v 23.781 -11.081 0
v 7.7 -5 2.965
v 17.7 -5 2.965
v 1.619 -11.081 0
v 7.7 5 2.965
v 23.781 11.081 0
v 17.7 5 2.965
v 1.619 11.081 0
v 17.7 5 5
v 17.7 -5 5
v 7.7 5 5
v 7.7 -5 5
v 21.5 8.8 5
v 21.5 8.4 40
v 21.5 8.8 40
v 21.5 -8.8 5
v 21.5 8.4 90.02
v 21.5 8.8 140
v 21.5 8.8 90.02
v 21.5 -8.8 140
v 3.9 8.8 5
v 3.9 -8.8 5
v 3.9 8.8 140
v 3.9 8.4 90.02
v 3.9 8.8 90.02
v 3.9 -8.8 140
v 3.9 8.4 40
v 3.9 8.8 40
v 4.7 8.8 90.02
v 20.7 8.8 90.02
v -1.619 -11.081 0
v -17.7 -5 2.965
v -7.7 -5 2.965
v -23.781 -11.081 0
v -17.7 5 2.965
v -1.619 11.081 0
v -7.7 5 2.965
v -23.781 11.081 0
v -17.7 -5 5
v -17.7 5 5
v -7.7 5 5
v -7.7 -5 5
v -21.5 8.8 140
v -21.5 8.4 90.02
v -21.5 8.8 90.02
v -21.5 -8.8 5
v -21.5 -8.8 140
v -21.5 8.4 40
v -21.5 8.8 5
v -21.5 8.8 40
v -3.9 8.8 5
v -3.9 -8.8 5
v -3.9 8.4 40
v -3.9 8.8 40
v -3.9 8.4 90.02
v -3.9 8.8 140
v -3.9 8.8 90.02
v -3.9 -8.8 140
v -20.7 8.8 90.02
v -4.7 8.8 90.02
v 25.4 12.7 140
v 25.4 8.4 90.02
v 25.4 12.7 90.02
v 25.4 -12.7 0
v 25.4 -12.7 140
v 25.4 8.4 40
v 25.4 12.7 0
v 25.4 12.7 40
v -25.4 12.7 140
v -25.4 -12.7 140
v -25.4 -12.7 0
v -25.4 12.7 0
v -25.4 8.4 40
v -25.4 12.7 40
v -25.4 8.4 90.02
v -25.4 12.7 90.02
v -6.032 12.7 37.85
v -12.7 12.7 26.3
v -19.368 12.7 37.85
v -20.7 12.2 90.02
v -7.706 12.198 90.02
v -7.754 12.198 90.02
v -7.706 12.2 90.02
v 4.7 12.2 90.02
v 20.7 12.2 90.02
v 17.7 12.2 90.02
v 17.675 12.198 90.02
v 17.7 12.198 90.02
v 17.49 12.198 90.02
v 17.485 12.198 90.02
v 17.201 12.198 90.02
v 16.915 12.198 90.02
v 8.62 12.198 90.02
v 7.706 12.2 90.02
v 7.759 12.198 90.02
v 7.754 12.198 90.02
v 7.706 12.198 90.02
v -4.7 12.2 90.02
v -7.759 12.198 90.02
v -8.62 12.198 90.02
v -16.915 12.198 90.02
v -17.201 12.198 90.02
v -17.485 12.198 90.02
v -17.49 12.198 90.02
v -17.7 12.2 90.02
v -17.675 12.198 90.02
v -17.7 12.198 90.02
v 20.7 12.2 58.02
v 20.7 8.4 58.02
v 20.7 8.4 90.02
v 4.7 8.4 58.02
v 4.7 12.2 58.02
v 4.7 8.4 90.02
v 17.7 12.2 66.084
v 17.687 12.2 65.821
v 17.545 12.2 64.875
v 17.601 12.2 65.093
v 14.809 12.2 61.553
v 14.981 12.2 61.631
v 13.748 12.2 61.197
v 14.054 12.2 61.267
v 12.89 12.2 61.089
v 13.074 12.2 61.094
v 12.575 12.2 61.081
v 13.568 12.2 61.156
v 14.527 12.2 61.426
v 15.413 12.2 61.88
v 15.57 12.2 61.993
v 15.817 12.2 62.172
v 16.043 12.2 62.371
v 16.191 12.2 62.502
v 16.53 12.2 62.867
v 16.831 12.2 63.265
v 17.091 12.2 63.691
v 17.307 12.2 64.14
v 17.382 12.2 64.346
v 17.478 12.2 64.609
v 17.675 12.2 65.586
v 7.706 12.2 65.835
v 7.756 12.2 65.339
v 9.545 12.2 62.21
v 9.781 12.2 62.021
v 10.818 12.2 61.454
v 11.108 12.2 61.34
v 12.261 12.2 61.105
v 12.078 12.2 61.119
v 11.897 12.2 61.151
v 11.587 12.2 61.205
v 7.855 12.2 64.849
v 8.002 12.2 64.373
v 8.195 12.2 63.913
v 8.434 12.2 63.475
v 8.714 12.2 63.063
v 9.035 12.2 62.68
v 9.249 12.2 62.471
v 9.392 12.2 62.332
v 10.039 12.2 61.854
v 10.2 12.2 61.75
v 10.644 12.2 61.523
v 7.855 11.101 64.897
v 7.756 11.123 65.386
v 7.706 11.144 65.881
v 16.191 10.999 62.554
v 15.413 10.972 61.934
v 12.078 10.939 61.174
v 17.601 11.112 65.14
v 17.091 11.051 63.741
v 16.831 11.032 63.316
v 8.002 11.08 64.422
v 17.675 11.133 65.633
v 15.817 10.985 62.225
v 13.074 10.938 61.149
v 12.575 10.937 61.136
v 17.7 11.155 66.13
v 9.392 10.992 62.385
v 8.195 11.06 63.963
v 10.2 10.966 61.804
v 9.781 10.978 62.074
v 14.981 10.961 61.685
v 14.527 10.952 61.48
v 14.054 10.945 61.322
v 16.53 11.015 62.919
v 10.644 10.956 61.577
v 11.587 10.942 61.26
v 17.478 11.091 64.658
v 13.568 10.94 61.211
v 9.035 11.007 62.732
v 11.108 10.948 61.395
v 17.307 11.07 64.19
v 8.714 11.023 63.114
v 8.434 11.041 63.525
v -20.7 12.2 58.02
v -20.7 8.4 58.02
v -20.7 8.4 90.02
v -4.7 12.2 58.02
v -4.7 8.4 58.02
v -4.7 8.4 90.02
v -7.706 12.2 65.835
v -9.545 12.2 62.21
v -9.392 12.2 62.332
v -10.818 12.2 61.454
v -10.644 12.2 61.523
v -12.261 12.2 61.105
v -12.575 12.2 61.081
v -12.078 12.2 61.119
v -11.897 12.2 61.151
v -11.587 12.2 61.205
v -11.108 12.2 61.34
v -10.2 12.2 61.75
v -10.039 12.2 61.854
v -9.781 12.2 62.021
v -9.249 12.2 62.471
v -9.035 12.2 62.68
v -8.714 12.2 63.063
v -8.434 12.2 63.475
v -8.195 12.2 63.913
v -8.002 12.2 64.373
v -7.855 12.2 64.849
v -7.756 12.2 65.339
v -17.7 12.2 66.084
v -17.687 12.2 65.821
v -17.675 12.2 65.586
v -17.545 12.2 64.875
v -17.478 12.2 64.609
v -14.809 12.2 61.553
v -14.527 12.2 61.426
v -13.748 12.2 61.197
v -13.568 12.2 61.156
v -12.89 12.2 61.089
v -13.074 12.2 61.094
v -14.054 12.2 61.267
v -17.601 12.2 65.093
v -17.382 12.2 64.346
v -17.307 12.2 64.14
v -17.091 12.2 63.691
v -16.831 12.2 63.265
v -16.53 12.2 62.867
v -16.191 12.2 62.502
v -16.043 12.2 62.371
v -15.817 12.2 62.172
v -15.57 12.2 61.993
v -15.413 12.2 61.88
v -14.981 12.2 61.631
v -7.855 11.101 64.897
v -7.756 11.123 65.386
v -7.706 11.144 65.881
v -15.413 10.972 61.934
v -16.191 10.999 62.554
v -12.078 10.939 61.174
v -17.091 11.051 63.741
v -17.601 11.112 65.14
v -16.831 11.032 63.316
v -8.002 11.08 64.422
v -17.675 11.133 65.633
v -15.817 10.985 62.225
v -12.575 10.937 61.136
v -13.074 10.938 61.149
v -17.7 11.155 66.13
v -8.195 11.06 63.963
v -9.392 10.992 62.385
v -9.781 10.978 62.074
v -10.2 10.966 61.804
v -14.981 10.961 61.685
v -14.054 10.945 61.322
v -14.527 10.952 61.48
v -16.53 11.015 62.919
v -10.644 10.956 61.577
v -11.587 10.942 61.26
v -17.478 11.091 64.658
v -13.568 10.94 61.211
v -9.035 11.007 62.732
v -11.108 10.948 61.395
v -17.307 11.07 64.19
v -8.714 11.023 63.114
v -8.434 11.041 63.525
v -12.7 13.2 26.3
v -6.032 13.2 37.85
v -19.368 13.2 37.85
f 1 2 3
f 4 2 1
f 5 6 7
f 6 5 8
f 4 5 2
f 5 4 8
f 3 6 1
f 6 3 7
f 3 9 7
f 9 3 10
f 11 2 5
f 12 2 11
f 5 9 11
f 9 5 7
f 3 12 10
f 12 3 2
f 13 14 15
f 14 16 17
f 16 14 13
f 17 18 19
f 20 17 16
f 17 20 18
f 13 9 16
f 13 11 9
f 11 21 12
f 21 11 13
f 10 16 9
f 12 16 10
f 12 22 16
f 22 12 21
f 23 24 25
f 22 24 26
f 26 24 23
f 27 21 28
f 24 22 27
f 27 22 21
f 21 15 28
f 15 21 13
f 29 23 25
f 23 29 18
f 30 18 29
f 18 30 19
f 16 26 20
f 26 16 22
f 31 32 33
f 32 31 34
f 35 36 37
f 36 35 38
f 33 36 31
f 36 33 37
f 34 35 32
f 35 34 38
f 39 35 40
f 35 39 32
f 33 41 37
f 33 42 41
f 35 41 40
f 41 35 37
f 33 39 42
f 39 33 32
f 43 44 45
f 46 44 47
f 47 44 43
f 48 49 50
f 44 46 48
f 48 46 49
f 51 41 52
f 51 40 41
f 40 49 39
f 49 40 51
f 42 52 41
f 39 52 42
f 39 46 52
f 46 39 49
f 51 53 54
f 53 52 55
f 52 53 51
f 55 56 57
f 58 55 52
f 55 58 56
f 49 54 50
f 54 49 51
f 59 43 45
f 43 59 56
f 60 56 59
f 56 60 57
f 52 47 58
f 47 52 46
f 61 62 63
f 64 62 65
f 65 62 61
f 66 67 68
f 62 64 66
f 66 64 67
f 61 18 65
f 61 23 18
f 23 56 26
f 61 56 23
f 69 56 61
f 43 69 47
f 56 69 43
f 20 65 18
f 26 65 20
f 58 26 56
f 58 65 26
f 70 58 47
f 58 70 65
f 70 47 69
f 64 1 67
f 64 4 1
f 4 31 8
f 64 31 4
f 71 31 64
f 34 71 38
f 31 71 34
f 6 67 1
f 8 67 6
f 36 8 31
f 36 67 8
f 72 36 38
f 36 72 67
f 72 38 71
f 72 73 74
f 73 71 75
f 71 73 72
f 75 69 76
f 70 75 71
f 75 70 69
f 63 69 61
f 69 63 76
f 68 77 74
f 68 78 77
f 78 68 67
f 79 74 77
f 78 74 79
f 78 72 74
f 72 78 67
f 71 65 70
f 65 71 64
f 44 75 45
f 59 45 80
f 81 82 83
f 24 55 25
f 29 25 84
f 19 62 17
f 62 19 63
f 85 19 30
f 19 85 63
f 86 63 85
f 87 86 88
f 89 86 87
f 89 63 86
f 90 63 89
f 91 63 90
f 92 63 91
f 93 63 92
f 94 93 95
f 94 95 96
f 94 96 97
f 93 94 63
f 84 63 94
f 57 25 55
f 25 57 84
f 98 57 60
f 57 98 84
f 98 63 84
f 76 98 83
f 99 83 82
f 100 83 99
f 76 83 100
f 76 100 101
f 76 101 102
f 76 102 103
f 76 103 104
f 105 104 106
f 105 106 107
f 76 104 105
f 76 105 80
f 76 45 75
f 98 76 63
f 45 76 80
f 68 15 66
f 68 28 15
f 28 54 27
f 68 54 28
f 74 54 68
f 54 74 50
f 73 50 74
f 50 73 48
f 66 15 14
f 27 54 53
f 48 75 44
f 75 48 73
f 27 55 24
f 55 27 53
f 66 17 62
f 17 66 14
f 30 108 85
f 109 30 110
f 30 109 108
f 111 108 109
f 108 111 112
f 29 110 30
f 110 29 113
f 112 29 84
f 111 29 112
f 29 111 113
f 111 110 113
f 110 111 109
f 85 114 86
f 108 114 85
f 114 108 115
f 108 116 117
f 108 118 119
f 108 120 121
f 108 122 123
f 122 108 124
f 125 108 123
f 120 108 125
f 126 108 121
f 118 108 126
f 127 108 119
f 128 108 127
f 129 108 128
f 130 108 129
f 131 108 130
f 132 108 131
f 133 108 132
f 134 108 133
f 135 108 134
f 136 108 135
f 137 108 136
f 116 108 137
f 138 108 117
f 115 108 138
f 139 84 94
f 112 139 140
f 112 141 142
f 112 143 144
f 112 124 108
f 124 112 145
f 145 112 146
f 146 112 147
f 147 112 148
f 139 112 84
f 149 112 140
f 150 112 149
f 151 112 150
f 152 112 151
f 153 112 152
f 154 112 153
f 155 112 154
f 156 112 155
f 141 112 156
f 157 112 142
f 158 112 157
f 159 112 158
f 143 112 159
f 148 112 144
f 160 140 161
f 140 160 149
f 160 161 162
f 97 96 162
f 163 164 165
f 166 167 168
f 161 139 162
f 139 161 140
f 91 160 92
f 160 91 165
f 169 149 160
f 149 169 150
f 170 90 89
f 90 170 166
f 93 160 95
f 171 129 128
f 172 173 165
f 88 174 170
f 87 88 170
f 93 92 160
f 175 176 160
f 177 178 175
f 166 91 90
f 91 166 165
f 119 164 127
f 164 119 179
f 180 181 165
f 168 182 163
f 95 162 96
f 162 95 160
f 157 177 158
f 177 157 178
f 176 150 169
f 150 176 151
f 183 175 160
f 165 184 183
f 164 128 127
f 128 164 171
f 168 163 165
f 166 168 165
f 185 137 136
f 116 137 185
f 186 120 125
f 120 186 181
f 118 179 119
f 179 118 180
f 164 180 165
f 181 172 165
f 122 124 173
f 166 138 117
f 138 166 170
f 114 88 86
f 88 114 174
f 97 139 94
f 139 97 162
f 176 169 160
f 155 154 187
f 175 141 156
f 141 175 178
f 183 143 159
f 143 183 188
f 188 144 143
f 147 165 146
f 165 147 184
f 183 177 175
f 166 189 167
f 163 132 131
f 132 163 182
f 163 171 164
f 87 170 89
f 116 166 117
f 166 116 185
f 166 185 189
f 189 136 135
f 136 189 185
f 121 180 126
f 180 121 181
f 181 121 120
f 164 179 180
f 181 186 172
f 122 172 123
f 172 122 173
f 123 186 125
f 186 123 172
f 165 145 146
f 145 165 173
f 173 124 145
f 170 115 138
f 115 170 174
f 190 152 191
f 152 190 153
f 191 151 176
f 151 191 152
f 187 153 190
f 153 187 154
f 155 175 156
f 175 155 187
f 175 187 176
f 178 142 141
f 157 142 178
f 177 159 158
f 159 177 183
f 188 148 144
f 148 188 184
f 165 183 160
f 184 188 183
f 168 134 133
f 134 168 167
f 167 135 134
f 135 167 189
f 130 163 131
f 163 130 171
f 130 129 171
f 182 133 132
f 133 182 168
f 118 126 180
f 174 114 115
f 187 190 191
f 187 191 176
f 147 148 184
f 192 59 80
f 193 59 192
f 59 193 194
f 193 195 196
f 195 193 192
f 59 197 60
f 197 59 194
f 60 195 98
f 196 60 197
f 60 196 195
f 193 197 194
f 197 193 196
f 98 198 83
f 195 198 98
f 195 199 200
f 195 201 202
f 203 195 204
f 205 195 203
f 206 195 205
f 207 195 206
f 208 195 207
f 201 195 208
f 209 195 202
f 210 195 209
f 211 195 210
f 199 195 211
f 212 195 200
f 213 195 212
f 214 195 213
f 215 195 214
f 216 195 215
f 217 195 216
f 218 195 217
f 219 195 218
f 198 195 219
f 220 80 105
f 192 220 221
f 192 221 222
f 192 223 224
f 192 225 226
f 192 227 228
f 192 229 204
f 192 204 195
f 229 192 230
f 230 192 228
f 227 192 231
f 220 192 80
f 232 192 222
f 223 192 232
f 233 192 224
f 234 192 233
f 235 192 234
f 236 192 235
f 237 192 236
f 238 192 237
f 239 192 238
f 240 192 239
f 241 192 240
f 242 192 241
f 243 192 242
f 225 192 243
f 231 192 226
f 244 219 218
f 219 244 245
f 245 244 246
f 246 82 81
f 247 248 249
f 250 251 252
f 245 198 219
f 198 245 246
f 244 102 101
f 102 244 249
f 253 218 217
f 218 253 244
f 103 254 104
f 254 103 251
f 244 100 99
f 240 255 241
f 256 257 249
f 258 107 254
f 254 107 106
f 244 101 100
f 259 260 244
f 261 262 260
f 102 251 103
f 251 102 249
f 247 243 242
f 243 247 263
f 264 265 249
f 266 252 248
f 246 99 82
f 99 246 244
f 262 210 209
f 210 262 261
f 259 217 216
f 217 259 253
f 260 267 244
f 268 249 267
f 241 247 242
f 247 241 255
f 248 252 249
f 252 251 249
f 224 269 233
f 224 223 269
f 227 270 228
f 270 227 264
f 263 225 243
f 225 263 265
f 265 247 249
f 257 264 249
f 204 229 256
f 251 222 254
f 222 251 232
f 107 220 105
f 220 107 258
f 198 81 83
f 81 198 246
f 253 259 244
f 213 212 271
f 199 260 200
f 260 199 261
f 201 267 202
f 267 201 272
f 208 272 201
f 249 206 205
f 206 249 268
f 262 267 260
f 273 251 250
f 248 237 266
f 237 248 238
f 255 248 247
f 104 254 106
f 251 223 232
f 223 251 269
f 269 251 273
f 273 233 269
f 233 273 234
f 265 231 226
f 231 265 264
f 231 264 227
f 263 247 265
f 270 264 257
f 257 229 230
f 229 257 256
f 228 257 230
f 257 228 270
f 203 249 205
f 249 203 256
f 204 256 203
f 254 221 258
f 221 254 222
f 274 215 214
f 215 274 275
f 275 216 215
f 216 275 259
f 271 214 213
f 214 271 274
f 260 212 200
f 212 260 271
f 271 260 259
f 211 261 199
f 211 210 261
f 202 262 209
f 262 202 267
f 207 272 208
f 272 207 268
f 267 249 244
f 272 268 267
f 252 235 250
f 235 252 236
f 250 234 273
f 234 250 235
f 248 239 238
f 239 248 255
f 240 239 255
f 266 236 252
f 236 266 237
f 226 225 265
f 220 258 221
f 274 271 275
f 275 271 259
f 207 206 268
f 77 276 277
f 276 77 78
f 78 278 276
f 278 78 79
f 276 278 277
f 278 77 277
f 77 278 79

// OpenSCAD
// file: shapes.scad
module rounded_cube(size, round_radius) {
  linear_extrude(height=size.z)
    translate([round_radius, round_radius])
      minkowski() {
        circle(r=round_radius);
        square(size - [round_radius*2, round_radius*2]);
      };
}
// file: rectangular_connector.scad
include <shapes.scad>;

spacing = 25.4;

smidge = 0.01;

pin_width = 10;
housing_height = 140;

notch_inset = 40;
notch = [spacing*2, 4.3, 50];

wall = 3.9;

cutout_offset = 5;
inside_cutout = [spacing - wall*2, spacing - wall*2, housing_height - cutout_offset + smidge];

led_lead = 5.3;

$fa=0.5;
$fs=0.5;


module mockup() {
  color("#333")
    rectangular_housing();

  % translate([0, 0, -50])
    led();

  color("gold") {
      translate([-spacing/2, 0, 5])
        pin_clamp();
      translate([spacing/2, 0, 5])
        pin_clamp();
        }
}

module rectangular_housing() {
  difference() {
    translate([-spacing, -spacing/2, 0])
    cube([spacing * 2, spacing, housing_height]);

    for (mir = [0, 1])
      mirror([ mir, 0, 0]) {
        translate([spacing/2, 0, -smidge])
          rotate([0, 0, 45])
            cylinder(d1=(spacing + 6), d2=pin_width + 4, h=3, $fn=4);

        translate([spacing/2 - pin_width/2, -pin_width/2, 0])
          cube([pin_width, pin_width, housing_height + smidge * 2]);

        translate([wall, -inside_cutout.y/2, cutout_offset])
          cube(inside_cutout);
      }
    translate([-notch.x/2 - smidge, spacing/2 - notch.y, notch_inset])
      cube(notch + [smidge * 2, smidge * 2, smidge * 2]);
  }

  // aarow
  translate([-spacing/2, spacing/2, notch_inset - 6])
    rotate([-90, 90, 0])
      cylinder(d=spacing - 10, h=0.5, $fn=3);


    tab = [16, notch.y - 0.5, 32];

    for (mir = [0, 1])
      mirror([ mir, 0, 0]) {
        translate([spacing/2, spacing/2 -0.5, notch_inset + notch.z + smidge*2])
        rotate([180, 0, 0])
        difference() {
          translate([-tab.x/2, 0, 0])
            cube(tab);
         translate([0, -2, 0])
          rotate([-92.5, 0, 0])
          linear_extrude(height=2)
          hull() {
            translate([0, -tab.z + 8])
              circle(d=10);
            circle(d=10);
          }
        }
      }
}

module pin_clamp() {
  clamp_height = 60;
  clamp_wall = 2;

  clamp_size = [inside_cutout.x - 0.5, inside_cutout.y - 2, clamp_height];
  clamp_cutout = [clamp_size.x, clamp_size.y, clamp_height]- [clamp_wall * 2, clamp_wall * 2, -smidge * 2];

  difference() {
    translate([-clamp_size.x/2, -clamp_size.y/2, 0])
      rounded_cube(clamp_size, 2);
    translate([-led_lead/2, -led_lead/2,-smidge])
      cube([led_lead, led_lead, clamp_height + smidge * 2]);

    translate([0, 0, 40])
      union() {
        translate([-clamp_size.x/2 - smidge, clamp_size.y/2 - clamp_wall * 4, 0])
          difference() {
            rotate([0, 90, 0])
              rounded_cube([25, clamp_size.y + smidge * 2, clamp_size.x + smidge * 2], 2);
            translate([clamp_size.x/2-led_lead/2,clamp_wall * 1 -led_lead/2,-33-smidge])
              cube([led_lead, led_lead +1.2, clamp_height + smidge * 2]);
          }
        translate([0, clamp_size.y/2, 33])
          translate([-10, -clamp_wall*2, -33-smidge])
            cube([20, 8+smidge, 14+smidge]);
        *translate([0, clamp_size.y/2, 33])
          translate([-14, -clamp_wall*2, -36-smidge])
            cube([20, 8+smidge, 8+smidge]);
      }

    difference() {
      translate([-clamp_cutout.x/2, -clamp_cutout.y/2, -smidge])
        rounded_cube(clamp_cutout, 1);
      translate([-led_lead/2 + smidge, -inside_cutout.y/2, 0])
        cube([led_lead - smidge*2, inside_cutout.y, clamp_height]);
    }
  }

  translate([0, clamp_size.y/2, 48]) {
    union() {
      translate([clamp_size.x/2, 0, 0])
        rotate([0, 0, 180])
        tab(clamp_size, clamp_wall);
      translate([-clamp_size.x/2, -clamp_wall, -8])
        rotate([180, 0, 0])
        tab(clamp_size, clamp_wall);
      }
  }
}

module tab(clamp_size, wall) {
  intersection() {
    translate([-6, 0, 0])
    rotate([-90, 0, 0])
      rounded_cube([20, 8, wall*2 + smidge], 1);

    difference() {
      translate([0, 0, -clamp_size.z/2])
        rounded_cube(clamp_size, 2);
      translate([wall, wall, -clamp_size.z/2 - smidge])
        rounded_cube(clamp_size - [wall*2, wall*2, 0], 2);
    }
  }
}

module led() {
  lead = 5.4;
  translate([0, 0, -50])
  cylinder(d=50, h=50);
  translate([25.4/2 - lead/2,-lead/2,0])
    cube([lead, lead, 155]);
  translate([-25.4/2 - lead/2,-lead/2,0])
    cube([lead, lead, 165]);
}
// main file
include <rectangular_connector.scad>;

rectangular_housing();
